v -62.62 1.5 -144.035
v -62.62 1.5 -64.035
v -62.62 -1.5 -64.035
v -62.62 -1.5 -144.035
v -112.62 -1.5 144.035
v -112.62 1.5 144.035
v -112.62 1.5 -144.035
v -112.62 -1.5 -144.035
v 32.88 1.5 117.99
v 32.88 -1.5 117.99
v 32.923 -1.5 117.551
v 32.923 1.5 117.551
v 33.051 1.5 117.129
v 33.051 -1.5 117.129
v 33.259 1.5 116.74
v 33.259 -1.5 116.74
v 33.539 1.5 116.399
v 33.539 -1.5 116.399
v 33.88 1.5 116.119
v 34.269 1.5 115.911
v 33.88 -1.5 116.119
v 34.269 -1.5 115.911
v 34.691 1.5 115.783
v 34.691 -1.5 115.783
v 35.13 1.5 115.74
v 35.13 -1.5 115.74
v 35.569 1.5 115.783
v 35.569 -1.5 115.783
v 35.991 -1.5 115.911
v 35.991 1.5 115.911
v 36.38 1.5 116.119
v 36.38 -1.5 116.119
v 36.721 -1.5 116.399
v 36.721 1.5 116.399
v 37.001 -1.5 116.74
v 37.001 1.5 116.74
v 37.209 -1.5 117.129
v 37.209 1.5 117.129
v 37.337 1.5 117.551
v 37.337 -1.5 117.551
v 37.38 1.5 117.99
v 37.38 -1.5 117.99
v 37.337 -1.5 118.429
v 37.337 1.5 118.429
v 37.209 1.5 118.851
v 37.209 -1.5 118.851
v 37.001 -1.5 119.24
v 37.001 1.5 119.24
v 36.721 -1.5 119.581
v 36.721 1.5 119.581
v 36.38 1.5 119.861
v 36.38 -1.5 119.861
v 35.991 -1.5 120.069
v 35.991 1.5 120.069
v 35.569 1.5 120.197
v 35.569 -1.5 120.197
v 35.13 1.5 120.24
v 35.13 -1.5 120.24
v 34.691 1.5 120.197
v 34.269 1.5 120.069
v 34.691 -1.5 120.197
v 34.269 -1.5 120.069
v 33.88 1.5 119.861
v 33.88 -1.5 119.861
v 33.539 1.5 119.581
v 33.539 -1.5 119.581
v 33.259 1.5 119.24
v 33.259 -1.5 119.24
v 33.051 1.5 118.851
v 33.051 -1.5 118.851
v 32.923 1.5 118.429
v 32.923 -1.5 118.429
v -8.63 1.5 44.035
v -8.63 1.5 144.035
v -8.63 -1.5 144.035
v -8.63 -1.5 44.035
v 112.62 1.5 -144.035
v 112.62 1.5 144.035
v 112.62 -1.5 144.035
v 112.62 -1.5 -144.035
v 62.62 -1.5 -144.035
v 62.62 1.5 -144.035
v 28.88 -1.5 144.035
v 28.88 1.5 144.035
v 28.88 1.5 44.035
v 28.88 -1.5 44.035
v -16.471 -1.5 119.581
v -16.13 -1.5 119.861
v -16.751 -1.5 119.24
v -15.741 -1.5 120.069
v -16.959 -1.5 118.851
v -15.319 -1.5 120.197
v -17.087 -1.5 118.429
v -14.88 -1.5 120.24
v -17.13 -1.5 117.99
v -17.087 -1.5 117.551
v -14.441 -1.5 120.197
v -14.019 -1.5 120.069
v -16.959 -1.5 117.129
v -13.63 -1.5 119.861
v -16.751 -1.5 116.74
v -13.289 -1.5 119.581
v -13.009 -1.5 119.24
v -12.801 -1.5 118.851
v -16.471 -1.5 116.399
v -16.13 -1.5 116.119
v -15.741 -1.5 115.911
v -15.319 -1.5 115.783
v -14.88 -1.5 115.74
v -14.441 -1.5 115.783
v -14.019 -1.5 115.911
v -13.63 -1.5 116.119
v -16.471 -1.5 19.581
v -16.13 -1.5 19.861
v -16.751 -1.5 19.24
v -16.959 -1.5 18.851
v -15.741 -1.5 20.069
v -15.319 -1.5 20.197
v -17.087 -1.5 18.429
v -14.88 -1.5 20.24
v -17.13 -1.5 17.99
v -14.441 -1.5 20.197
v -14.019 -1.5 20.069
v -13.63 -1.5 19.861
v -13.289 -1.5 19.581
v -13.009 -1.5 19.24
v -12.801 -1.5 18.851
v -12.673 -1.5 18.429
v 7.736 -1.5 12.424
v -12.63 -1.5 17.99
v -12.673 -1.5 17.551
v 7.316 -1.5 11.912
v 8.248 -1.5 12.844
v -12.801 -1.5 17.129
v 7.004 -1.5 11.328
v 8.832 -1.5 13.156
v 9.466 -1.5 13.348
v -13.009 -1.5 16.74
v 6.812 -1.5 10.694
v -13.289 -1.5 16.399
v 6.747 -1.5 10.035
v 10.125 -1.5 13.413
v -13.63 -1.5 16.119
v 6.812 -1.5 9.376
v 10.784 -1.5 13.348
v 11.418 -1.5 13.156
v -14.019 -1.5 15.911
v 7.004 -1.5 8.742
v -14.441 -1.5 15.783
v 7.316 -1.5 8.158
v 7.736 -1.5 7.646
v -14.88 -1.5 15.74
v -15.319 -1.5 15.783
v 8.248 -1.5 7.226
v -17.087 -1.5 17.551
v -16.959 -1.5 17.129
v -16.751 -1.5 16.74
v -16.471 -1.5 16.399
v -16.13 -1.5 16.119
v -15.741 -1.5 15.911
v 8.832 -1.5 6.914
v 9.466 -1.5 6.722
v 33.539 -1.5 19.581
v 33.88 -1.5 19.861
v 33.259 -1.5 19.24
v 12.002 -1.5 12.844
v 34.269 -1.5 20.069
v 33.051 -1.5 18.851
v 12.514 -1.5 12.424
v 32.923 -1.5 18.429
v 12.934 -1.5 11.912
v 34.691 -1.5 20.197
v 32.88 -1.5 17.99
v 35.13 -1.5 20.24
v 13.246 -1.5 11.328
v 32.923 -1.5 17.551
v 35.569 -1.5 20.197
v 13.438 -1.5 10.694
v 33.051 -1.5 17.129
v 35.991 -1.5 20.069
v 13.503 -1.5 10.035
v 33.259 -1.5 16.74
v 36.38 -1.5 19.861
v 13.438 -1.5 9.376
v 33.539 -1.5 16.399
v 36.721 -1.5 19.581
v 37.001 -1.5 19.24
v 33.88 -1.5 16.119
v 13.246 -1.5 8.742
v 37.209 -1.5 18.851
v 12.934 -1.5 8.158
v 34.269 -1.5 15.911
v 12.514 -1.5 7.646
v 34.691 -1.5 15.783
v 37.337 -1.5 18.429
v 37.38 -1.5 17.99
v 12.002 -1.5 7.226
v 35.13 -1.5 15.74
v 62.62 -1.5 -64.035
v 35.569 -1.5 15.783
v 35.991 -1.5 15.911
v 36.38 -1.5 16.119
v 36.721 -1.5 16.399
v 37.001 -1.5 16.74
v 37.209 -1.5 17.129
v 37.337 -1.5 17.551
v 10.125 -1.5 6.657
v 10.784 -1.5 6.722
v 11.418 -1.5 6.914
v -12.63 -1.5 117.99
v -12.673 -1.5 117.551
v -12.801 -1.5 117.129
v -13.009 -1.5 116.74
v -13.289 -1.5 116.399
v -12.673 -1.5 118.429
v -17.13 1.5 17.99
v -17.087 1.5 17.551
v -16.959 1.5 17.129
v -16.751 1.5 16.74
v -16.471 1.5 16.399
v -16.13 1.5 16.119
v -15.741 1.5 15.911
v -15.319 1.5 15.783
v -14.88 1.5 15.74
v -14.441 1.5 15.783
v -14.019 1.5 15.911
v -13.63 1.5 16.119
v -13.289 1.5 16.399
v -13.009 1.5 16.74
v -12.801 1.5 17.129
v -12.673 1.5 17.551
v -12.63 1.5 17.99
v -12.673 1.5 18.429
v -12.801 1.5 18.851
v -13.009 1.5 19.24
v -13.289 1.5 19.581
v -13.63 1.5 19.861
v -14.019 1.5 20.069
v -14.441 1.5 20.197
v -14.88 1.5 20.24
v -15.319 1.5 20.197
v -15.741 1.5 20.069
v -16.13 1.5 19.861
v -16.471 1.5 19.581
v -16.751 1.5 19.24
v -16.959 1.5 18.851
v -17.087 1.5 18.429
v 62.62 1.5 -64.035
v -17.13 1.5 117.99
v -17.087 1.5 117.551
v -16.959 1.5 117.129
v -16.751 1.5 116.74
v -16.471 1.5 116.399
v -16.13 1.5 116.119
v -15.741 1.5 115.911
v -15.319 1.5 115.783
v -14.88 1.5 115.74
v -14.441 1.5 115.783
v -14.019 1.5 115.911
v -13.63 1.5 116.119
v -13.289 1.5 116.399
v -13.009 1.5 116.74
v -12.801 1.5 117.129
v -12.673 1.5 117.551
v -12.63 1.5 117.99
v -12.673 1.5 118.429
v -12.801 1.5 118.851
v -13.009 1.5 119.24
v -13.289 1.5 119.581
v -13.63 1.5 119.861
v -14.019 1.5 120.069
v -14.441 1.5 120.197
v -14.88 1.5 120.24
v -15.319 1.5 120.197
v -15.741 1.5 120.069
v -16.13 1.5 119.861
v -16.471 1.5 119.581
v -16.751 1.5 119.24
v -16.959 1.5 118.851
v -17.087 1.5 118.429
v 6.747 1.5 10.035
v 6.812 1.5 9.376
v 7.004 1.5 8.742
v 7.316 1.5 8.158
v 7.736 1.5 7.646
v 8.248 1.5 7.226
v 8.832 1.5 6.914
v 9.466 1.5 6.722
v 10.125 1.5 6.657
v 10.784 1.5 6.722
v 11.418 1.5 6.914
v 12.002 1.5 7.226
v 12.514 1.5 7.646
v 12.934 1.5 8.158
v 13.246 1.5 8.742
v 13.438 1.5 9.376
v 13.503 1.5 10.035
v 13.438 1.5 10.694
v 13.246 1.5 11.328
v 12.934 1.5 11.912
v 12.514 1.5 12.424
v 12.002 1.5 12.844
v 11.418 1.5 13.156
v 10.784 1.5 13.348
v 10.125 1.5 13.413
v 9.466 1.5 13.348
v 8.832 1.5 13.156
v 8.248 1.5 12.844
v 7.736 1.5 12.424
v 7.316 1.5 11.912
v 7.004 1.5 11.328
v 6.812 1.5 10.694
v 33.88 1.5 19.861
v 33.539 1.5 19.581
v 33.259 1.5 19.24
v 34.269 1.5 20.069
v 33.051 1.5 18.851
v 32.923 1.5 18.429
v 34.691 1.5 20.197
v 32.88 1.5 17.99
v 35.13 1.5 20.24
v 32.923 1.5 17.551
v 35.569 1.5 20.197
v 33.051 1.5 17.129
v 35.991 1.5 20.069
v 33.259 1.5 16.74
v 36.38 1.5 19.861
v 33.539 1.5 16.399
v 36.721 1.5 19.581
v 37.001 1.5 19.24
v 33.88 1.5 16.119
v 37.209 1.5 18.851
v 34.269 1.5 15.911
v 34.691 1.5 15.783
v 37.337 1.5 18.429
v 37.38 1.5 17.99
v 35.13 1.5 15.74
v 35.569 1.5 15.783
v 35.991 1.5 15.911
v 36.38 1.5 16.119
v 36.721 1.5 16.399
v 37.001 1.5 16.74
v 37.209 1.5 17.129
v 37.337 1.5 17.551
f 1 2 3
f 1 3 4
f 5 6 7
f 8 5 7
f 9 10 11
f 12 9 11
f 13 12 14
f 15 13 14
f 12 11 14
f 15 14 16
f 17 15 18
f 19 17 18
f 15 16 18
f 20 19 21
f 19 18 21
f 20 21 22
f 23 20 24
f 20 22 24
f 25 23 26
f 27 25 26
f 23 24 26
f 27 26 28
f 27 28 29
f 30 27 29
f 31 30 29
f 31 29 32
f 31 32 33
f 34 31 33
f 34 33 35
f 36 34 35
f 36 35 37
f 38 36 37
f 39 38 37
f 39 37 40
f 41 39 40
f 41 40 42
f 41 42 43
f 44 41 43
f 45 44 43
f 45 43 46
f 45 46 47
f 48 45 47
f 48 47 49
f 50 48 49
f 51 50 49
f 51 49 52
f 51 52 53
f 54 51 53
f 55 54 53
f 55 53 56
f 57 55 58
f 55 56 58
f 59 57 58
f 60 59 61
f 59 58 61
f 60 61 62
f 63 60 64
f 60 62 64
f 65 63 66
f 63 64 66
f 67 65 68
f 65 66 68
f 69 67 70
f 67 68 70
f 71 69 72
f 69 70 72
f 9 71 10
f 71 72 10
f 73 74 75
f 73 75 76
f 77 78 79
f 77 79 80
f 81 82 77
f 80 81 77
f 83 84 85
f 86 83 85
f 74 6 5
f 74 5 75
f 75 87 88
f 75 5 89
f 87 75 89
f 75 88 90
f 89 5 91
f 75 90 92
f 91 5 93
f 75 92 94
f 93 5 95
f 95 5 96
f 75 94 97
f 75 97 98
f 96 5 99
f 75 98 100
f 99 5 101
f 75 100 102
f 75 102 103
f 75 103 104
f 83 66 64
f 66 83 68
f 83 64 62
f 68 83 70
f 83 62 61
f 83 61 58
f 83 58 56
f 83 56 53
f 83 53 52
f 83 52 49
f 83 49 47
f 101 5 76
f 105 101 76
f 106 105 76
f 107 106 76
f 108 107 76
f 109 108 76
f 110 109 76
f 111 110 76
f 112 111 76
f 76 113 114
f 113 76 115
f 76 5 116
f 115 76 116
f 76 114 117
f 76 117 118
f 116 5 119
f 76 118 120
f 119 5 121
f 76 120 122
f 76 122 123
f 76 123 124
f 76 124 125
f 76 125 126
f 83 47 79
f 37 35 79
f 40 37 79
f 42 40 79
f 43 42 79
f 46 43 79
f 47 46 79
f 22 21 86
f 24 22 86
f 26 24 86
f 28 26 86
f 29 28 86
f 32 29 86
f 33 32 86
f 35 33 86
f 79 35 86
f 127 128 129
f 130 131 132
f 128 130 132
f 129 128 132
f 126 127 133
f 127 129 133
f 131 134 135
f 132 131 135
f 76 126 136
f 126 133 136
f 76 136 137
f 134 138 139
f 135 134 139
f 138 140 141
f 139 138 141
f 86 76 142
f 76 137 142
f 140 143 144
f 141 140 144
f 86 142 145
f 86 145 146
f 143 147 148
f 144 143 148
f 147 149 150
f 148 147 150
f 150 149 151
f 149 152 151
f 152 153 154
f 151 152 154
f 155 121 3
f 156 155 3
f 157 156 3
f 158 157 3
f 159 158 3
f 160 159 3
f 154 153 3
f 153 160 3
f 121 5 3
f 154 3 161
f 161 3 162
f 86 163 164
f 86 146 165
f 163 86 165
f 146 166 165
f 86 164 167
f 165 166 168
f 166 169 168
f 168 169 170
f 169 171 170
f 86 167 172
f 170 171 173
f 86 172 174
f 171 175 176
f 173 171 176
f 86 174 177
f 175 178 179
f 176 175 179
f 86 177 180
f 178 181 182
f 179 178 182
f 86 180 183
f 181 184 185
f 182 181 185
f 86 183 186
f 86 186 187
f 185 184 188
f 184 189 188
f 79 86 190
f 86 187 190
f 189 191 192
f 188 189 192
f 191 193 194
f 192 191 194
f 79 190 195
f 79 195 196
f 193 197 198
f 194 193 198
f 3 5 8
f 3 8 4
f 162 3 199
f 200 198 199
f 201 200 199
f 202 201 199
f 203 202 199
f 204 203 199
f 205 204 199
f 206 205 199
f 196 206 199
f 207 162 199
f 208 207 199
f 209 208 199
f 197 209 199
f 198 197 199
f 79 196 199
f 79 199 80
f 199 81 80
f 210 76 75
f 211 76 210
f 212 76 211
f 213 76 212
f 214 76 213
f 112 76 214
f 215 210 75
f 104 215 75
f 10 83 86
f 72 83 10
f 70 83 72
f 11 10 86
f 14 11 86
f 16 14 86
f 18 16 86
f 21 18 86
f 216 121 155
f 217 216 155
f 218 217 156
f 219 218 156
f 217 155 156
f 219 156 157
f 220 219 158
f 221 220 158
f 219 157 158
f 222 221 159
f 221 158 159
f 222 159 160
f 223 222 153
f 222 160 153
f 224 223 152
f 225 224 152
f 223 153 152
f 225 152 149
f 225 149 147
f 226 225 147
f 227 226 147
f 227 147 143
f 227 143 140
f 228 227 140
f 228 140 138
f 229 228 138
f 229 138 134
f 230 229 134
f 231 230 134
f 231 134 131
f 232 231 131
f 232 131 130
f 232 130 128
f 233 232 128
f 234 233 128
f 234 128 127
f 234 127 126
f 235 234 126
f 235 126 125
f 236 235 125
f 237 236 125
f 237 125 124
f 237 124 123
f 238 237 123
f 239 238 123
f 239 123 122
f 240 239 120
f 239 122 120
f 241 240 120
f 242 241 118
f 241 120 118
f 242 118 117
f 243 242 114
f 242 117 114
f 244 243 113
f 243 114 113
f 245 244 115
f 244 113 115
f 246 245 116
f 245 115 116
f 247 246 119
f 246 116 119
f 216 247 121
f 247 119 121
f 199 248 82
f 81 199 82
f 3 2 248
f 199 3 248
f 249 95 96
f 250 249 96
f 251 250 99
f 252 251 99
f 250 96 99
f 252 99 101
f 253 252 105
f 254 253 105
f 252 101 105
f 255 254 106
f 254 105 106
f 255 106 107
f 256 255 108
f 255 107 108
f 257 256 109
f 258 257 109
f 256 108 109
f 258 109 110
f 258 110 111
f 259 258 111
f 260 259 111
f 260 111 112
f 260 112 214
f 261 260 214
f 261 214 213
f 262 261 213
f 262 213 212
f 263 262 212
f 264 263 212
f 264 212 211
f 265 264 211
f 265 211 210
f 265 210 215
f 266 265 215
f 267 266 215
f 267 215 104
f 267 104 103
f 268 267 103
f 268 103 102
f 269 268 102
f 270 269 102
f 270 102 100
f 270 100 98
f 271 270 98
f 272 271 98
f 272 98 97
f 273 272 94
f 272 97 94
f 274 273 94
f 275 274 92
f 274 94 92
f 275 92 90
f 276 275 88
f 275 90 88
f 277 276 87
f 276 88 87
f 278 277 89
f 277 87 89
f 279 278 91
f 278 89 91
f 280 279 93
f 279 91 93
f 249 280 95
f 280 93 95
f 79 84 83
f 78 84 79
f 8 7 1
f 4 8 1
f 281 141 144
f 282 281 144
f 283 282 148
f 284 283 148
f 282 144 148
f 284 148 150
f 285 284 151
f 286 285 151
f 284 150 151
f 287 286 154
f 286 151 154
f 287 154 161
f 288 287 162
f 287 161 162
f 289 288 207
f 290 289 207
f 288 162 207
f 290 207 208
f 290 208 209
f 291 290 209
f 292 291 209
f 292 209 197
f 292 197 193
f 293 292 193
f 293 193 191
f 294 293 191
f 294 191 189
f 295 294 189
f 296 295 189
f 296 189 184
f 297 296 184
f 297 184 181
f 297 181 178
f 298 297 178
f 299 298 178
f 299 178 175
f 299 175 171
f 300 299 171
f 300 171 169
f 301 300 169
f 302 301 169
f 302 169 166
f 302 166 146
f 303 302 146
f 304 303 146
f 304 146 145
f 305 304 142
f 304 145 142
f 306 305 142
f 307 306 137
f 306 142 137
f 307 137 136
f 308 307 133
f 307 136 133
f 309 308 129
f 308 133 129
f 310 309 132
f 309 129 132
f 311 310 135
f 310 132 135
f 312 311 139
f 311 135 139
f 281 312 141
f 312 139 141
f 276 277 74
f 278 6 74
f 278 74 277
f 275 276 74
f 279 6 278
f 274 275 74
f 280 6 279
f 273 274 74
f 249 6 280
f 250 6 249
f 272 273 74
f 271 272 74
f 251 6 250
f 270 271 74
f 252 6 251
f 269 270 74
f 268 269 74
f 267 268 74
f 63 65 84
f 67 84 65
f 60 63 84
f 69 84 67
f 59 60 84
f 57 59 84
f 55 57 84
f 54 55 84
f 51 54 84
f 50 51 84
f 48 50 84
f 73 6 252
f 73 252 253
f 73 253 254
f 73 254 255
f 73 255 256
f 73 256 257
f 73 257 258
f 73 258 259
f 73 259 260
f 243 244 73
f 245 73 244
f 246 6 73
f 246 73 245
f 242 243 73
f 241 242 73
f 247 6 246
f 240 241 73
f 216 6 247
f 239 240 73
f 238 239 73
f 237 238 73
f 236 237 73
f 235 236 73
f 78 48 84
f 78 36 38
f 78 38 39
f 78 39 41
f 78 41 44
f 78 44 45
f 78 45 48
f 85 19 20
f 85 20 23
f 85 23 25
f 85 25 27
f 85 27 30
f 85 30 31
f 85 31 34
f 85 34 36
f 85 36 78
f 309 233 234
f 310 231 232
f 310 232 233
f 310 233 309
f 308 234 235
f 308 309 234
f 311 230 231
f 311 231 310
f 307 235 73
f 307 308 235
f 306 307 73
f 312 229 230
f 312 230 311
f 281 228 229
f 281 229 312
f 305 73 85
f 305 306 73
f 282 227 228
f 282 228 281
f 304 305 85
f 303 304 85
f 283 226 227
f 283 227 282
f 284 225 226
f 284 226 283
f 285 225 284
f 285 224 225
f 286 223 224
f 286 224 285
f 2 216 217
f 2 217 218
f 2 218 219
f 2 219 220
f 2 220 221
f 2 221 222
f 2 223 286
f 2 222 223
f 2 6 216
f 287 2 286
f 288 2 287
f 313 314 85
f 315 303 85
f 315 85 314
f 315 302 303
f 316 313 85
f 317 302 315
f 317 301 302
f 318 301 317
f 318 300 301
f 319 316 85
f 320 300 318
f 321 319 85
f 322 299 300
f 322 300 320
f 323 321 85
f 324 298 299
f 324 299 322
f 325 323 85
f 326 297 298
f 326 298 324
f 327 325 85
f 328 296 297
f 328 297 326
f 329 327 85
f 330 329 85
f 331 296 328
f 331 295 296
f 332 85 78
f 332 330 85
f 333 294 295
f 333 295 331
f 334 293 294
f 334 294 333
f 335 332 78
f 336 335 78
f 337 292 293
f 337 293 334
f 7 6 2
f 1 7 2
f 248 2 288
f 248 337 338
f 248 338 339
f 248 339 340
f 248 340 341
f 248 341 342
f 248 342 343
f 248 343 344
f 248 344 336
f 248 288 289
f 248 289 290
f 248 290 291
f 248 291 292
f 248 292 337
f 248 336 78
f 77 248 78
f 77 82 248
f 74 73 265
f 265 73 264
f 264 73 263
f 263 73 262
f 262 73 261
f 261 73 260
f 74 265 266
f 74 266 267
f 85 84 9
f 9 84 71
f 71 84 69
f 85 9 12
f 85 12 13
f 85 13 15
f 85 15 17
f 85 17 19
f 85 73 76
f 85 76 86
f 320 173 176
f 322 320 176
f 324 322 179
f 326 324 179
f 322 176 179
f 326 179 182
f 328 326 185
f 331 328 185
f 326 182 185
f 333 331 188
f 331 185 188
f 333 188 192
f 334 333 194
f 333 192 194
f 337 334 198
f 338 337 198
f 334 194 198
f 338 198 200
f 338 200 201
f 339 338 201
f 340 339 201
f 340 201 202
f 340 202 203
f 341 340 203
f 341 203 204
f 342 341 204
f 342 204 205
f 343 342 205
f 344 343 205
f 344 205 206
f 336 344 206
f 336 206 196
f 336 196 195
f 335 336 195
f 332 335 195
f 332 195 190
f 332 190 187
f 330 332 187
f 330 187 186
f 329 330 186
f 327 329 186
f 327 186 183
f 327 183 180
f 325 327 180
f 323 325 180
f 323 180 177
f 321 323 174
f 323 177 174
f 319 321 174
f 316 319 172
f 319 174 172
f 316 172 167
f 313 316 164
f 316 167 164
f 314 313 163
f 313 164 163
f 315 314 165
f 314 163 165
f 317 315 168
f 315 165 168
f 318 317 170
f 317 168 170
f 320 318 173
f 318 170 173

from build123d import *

# Parameters (mm, degrees)
SKETCH1_W                   = 225.24
SKETCH1_H                   = 288.07
BOSS_EXTRUDE1_DEPTH         = 1.5
M4_CLEARANCE_HOLE1_D        = 4.5
F_1_4_CLEARANCE_HOLE1_D     = 6.7564
F_1_4_CLEARANCE_HOLE1_DEPTH = 20
F_1_4_CLEARANCE_HOLE1_TIP   = 2.029827343
SKETCH6_W                   = 125.24
SKETCH6_H                   = 80
SKETCH6_W_2                 = 37.51
SKETCH6_H_2                 = 100
CUT_EXTRUDE1_DEPTH          = 183.861547694


with BuildPart() as part:
    # Sketch1 → Boss-Extrude1 (new, symmetric)
    with BuildSketch(Plane(origin=(0, 0, 0), x_dir=(1, 0, 0), z_dir=(0, 1, 0))):
        Rectangle(SKETCH1_W, SKETCH1_H)
    extrude(amount=BOSS_EXTRUDE1_DEPTH, both=True)

    # M4 Clearance Hole1 (through all)
    with Locations(Plane(origin=(0, 1.5, 0), x_dir=(1, 0, 0), z_dir=(0, 1, 0))):
        with Locations((-14.88, -117.99), (-14.88, -17.99), (35.13, -117.99), (35.13, -17.99)):
            Hole(M4_CLEARANCE_HOLE1_D / 2)

    # 1/4 Clearance Hole1
    with Locations(Plane(origin=(0, 1.5, 0), x_dir=(1, 0, 0), z_dir=(0, 1, 0))):
        with Locations((10.125, -10.035)):
            Hole(F_1_4_CLEARANCE_HOLE1_D / 2, depth=F_1_4_CLEARANCE_HOLE1_DEPTH)
            with Locations((0, 0, -(F_1_4_CLEARANCE_HOLE1_DEPTH + F_1_4_CLEARANCE_HOLE1_TIP / 2))):  # 118° drill point
                Cone(0, F_1_4_CLEARANCE_HOLE1_D / 2, F_1_4_CLEARANCE_HOLE1_TIP, mode=Mode.SUBTRACT)

    # Sketch6 → Cut-Extrude1 (cut, through all)
    with BuildSketch(Plane(origin=(0, 1.5, 0), x_dir=(1, 0, 0), z_dir=(0, 1, 0))):
        with Locations((0, 104.035)):
            Rectangle(SKETCH6_W, SKETCH6_H)
        with Locations((10.125, -94.035)):
            Rectangle(SKETCH6_W_2, SKETCH6_H_2)
    extrude(amount=-CUT_EXTRUDE1_DEPTH, mode=Mode.SUBTRACT)


solid = part.part
